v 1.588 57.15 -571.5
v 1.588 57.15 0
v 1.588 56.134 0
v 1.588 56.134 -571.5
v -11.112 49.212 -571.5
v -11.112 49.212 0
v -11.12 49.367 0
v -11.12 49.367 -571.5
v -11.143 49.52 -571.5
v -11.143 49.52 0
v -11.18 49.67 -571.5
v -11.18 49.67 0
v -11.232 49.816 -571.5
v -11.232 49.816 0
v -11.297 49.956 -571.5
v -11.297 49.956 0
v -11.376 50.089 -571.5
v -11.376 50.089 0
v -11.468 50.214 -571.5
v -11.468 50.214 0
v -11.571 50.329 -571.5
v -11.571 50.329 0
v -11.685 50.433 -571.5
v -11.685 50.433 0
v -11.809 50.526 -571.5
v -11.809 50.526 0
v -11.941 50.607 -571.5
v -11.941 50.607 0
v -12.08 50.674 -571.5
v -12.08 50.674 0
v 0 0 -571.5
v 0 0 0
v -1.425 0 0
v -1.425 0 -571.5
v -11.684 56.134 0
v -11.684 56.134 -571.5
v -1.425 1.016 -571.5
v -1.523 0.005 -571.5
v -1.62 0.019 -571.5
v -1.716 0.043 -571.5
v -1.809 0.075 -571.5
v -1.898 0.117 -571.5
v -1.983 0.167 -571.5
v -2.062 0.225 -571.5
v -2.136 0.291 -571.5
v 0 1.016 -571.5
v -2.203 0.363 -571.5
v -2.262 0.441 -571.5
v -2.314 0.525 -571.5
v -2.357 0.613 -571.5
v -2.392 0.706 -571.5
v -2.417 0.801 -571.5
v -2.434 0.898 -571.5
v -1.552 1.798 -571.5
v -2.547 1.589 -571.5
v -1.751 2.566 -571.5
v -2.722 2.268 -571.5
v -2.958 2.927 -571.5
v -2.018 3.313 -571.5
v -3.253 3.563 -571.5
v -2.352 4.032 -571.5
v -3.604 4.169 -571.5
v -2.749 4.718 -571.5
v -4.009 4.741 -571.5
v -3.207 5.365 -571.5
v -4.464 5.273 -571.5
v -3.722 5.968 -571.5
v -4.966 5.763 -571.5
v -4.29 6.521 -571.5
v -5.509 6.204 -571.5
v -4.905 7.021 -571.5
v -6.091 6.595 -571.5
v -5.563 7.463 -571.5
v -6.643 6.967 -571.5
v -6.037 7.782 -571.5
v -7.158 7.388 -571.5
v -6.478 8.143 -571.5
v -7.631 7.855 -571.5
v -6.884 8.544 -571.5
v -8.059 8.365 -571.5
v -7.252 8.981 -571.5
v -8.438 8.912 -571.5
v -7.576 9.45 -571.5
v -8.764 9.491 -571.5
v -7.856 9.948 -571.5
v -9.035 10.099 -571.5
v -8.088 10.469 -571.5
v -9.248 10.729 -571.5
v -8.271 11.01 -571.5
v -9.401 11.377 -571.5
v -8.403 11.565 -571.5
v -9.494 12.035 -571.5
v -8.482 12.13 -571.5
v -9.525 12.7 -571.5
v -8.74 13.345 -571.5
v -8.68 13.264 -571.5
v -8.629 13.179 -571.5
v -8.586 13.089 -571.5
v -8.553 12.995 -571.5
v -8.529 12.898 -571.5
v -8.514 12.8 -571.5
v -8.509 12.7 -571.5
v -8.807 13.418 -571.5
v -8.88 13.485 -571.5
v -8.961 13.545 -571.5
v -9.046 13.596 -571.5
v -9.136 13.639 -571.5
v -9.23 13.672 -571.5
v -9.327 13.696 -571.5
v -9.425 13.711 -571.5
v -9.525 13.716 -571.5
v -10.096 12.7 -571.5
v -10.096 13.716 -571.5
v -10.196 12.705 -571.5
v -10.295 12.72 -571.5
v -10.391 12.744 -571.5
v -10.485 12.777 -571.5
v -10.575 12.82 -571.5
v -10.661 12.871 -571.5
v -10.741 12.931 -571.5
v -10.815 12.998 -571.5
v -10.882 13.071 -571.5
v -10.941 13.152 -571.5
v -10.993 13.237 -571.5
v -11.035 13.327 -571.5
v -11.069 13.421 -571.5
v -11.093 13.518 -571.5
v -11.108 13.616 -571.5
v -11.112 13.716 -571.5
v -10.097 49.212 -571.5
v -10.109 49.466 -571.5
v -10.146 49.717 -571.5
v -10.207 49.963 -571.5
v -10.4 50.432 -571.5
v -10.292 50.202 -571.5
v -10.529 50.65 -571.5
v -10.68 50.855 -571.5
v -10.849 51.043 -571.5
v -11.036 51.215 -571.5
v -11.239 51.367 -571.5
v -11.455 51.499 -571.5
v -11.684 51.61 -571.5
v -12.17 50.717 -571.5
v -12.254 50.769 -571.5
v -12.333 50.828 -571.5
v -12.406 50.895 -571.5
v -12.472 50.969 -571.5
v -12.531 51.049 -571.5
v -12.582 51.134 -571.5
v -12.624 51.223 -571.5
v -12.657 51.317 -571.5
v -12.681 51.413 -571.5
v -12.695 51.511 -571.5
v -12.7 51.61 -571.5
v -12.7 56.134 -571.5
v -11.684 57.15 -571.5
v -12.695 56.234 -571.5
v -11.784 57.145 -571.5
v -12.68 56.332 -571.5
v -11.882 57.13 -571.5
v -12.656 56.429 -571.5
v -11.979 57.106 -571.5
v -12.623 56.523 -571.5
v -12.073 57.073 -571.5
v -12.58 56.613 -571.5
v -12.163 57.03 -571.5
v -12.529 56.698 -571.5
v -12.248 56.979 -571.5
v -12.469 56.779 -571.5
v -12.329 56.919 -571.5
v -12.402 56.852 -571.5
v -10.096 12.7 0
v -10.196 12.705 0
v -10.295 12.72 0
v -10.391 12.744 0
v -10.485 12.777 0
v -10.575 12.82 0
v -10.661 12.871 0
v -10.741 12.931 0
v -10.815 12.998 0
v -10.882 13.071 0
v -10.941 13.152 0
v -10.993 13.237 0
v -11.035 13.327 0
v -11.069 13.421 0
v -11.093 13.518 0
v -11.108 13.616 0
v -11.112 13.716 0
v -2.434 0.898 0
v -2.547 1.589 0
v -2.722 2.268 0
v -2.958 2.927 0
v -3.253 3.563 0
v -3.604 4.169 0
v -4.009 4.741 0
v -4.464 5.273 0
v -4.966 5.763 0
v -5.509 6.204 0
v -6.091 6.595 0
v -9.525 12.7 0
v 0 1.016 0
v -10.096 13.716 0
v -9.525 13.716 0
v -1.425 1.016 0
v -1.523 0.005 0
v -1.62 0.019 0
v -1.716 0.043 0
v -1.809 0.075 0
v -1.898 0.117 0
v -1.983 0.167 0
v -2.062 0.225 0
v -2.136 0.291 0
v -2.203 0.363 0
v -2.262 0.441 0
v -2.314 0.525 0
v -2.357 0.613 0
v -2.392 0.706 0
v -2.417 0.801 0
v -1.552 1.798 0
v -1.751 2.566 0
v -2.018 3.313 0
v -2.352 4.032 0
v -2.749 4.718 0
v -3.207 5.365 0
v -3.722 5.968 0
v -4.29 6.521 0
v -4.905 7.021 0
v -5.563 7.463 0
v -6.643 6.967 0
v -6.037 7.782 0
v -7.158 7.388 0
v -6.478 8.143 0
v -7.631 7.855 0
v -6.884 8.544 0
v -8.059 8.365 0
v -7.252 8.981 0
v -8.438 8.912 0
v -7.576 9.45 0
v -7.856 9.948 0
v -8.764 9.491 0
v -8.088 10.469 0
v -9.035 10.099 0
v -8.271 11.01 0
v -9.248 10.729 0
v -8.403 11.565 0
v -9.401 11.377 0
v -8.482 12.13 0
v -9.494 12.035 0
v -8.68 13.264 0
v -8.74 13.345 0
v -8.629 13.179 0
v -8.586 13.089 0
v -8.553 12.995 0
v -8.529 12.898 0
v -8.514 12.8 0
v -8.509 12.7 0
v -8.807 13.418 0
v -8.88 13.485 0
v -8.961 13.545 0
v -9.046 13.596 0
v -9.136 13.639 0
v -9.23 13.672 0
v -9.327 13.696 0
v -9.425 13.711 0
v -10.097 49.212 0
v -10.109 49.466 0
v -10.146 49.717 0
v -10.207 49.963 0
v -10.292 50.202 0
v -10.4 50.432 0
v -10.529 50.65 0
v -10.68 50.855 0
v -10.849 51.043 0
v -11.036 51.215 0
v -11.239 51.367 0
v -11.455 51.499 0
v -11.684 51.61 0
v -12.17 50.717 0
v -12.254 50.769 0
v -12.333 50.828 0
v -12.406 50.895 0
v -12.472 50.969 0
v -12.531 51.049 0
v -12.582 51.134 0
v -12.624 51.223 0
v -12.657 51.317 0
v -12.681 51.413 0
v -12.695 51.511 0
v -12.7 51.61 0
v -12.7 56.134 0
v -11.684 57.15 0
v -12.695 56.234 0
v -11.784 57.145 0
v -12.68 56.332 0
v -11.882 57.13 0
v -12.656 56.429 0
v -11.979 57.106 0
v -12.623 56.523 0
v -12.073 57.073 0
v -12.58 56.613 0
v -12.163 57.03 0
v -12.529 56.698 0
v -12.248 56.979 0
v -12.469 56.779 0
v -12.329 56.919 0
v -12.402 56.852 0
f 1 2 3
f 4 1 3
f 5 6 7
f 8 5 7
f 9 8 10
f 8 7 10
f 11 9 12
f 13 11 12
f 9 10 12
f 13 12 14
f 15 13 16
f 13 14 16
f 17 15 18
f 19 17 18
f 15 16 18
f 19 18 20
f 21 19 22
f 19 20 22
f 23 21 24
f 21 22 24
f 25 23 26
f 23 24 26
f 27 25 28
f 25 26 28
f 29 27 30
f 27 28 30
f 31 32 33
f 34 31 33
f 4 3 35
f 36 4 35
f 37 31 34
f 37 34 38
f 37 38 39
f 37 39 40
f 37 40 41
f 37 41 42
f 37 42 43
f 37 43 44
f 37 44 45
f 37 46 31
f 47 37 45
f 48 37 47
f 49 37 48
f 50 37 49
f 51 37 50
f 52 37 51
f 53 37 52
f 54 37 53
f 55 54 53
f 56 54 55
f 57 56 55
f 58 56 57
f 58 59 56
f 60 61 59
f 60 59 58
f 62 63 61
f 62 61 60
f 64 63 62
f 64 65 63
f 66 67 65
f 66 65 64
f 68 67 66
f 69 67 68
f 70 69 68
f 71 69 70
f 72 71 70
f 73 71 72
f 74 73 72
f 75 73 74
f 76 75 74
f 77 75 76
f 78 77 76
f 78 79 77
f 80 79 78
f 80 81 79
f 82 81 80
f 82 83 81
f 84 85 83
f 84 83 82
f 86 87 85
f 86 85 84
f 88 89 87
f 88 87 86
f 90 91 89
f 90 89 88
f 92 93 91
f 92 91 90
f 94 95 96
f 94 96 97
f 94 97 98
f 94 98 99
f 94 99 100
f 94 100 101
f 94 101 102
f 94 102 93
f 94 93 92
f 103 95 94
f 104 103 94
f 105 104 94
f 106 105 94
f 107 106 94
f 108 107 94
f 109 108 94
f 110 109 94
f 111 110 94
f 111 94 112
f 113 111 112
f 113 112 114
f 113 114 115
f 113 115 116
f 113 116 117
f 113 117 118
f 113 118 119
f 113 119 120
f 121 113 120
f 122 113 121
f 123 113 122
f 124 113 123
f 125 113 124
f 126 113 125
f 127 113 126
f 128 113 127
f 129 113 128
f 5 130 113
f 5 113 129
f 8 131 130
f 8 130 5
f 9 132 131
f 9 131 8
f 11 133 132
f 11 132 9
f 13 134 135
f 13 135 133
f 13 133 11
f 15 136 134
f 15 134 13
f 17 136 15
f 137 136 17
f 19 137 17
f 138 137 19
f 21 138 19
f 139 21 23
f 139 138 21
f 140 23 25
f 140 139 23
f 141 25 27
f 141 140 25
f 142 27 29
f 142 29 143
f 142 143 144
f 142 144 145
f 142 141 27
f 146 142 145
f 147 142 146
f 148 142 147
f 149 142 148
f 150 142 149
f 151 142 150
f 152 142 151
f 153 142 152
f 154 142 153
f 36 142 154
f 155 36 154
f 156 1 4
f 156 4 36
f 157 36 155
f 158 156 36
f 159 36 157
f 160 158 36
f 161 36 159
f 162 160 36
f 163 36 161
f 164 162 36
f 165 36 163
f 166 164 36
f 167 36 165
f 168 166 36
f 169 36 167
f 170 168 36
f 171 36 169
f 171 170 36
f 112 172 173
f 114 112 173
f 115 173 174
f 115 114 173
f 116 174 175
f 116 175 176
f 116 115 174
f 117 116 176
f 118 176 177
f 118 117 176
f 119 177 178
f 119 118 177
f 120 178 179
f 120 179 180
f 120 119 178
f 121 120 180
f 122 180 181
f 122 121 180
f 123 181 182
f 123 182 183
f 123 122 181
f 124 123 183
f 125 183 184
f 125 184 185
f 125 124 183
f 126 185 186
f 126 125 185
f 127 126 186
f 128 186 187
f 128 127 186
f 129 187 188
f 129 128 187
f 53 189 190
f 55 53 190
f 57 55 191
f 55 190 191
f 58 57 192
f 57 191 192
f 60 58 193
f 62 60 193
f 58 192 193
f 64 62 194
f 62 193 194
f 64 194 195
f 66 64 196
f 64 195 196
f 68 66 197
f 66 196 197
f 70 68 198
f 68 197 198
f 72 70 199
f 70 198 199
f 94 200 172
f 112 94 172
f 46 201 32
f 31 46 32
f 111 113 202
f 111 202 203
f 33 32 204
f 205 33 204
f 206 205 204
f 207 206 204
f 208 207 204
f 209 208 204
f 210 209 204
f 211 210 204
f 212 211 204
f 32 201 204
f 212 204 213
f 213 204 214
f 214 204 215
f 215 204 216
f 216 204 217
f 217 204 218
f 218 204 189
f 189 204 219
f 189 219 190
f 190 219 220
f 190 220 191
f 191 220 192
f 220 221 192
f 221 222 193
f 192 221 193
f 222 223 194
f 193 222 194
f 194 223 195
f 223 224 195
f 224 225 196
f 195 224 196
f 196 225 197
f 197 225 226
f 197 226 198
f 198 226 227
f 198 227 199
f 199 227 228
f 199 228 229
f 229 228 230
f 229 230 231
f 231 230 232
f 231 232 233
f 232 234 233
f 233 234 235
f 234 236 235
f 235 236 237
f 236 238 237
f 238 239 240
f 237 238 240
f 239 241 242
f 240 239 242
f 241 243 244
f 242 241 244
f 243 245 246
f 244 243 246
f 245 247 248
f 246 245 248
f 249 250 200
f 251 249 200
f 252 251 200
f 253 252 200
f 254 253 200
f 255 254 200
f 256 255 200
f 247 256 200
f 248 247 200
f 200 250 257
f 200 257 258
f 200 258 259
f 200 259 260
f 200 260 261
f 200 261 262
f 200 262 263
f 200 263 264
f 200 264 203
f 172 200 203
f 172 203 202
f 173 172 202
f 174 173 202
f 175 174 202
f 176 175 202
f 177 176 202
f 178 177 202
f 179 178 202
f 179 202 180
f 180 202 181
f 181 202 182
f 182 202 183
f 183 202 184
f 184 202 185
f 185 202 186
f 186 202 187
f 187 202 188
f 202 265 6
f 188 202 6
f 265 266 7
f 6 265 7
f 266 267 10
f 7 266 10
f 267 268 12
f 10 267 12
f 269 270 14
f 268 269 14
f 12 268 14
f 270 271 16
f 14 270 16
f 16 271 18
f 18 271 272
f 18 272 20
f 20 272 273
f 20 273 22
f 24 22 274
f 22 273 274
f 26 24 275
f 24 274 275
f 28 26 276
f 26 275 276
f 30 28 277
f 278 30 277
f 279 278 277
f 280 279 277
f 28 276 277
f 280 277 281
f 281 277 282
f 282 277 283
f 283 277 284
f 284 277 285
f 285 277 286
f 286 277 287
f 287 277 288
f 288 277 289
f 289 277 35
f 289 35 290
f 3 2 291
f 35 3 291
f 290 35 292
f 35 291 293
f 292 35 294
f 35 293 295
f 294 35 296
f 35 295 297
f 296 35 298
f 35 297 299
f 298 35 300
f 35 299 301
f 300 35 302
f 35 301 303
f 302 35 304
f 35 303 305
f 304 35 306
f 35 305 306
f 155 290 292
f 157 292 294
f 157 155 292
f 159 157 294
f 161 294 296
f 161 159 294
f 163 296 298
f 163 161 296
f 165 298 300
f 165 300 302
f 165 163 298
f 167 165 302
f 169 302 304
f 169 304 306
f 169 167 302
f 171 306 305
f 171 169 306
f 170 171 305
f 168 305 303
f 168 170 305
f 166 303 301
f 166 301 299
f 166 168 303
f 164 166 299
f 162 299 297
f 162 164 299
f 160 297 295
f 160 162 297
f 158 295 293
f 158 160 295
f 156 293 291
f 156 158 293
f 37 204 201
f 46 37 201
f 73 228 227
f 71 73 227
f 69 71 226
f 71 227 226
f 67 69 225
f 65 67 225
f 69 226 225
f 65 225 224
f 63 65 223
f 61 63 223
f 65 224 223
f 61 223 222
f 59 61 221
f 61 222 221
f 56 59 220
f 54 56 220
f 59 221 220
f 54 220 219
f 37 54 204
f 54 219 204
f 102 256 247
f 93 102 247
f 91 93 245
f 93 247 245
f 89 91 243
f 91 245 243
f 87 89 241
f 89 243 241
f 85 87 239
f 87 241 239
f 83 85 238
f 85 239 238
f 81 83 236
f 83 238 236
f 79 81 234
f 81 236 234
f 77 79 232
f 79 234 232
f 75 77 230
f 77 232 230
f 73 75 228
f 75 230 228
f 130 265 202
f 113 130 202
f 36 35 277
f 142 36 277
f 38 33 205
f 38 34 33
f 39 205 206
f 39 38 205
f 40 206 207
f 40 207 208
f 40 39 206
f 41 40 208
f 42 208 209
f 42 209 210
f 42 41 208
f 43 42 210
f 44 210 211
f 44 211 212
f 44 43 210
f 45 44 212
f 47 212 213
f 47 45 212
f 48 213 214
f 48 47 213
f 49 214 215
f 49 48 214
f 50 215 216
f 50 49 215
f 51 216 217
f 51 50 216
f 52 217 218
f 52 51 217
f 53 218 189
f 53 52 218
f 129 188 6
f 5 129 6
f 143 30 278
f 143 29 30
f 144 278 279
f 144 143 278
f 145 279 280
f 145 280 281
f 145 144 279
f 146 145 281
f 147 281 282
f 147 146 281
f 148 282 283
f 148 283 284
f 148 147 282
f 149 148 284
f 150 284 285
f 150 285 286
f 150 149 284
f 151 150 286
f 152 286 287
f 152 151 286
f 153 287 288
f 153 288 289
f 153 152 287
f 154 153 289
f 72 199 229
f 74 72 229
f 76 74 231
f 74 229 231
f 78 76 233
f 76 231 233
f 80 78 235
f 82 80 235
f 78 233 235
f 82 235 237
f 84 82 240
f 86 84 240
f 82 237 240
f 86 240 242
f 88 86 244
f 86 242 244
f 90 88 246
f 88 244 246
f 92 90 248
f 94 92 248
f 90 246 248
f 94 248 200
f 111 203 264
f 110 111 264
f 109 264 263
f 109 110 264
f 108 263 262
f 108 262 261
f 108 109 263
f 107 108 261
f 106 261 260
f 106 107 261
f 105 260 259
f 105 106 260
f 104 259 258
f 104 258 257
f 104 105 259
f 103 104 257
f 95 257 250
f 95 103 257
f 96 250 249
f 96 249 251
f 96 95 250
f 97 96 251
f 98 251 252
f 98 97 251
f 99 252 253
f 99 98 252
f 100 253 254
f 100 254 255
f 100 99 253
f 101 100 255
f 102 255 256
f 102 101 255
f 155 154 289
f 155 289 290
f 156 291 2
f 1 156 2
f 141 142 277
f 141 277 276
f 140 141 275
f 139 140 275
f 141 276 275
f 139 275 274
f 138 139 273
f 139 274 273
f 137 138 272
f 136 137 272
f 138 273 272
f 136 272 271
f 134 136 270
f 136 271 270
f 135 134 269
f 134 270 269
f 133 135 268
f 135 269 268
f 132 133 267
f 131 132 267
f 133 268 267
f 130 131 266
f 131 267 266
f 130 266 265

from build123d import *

# Parameters (mm, degrees)
EXTRUDE_THIN1_DEPTH = 571.5
FILLET1_R           = 1.016


with BuildPart() as part:
    # Sketch1 → Extrude-Thin1 (new body)
    with BuildSketch(Plane.XY):
        with BuildLine():
            Line((0, 0), (-2.38125, 0))
            ThreePointArc((-2.38125, 0), (-3.372303364, 3.783352795), (-6.090912463, 6.59495549))
            ThreePointArc((-6.090912463, 6.59495549), (-8.607567743, 9.197696269), (-9.525, 12.7))
            Line((-9.525, 12.7), (-11.1125, 12.7))
            Line((-11.1125, 12.7), (-11.1125, 49.2125))
            ThreePointArc((-11.1125, 49.2125), (-11.577467985, 50.335032015), (-12.7, 50.8))
            Line((-12.7, 50.8), (-12.7, 57.15))
            Line((-12.7, 57.15), (1.5875, 57.15))
            Line((1.5875, 57.15), (1.5875, 56.134))
            Line((1.5875, 56.134), (-11.684, 56.134))
            Line((-11.684, 56.134), (-11.684, 51.609572433))
            ThreePointArc((-11.684, 51.609572433), (-10.529358591, 50.650042391), (-10.0965, 49.2125))
            Line((-10.0965, 49.2125), (-10.0965, 13.716))
            Line((-10.0965, 13.716), (-8.424185054, 13.716))
            ThreePointArc((-8.424185054, 13.716), (-7.953453255, 10.150515553), (-5.563316024, 7.463228487))
            ThreePointArc((-5.563316024, 7.463228487), (-2.749191769, 4.717697591), (-1.424552135, 1.016))
            Line((-1.424552135, 1.016), (0, 1.016))
            Line((0, 1.016), (0, 0))
        make_face()
    extrude(amount=-EXTRUDE_THIN1_DEPTH)

    # Fillet1
    fillet1_edges = [part.edges().sort_by_distance(p)[0] for p in [
        (-8.424185054, 13.716, -285.75),
        (-2.38125, 0, -285.75),
        (-11.1125, 12.7, -285.75),
        (-12.7, 50.8, -285.75),
        (-12.7, 57.15, -285.75),
    ]]
    fillet(fillet1_edges, radius=FILLET1_R)


solid = part.part
